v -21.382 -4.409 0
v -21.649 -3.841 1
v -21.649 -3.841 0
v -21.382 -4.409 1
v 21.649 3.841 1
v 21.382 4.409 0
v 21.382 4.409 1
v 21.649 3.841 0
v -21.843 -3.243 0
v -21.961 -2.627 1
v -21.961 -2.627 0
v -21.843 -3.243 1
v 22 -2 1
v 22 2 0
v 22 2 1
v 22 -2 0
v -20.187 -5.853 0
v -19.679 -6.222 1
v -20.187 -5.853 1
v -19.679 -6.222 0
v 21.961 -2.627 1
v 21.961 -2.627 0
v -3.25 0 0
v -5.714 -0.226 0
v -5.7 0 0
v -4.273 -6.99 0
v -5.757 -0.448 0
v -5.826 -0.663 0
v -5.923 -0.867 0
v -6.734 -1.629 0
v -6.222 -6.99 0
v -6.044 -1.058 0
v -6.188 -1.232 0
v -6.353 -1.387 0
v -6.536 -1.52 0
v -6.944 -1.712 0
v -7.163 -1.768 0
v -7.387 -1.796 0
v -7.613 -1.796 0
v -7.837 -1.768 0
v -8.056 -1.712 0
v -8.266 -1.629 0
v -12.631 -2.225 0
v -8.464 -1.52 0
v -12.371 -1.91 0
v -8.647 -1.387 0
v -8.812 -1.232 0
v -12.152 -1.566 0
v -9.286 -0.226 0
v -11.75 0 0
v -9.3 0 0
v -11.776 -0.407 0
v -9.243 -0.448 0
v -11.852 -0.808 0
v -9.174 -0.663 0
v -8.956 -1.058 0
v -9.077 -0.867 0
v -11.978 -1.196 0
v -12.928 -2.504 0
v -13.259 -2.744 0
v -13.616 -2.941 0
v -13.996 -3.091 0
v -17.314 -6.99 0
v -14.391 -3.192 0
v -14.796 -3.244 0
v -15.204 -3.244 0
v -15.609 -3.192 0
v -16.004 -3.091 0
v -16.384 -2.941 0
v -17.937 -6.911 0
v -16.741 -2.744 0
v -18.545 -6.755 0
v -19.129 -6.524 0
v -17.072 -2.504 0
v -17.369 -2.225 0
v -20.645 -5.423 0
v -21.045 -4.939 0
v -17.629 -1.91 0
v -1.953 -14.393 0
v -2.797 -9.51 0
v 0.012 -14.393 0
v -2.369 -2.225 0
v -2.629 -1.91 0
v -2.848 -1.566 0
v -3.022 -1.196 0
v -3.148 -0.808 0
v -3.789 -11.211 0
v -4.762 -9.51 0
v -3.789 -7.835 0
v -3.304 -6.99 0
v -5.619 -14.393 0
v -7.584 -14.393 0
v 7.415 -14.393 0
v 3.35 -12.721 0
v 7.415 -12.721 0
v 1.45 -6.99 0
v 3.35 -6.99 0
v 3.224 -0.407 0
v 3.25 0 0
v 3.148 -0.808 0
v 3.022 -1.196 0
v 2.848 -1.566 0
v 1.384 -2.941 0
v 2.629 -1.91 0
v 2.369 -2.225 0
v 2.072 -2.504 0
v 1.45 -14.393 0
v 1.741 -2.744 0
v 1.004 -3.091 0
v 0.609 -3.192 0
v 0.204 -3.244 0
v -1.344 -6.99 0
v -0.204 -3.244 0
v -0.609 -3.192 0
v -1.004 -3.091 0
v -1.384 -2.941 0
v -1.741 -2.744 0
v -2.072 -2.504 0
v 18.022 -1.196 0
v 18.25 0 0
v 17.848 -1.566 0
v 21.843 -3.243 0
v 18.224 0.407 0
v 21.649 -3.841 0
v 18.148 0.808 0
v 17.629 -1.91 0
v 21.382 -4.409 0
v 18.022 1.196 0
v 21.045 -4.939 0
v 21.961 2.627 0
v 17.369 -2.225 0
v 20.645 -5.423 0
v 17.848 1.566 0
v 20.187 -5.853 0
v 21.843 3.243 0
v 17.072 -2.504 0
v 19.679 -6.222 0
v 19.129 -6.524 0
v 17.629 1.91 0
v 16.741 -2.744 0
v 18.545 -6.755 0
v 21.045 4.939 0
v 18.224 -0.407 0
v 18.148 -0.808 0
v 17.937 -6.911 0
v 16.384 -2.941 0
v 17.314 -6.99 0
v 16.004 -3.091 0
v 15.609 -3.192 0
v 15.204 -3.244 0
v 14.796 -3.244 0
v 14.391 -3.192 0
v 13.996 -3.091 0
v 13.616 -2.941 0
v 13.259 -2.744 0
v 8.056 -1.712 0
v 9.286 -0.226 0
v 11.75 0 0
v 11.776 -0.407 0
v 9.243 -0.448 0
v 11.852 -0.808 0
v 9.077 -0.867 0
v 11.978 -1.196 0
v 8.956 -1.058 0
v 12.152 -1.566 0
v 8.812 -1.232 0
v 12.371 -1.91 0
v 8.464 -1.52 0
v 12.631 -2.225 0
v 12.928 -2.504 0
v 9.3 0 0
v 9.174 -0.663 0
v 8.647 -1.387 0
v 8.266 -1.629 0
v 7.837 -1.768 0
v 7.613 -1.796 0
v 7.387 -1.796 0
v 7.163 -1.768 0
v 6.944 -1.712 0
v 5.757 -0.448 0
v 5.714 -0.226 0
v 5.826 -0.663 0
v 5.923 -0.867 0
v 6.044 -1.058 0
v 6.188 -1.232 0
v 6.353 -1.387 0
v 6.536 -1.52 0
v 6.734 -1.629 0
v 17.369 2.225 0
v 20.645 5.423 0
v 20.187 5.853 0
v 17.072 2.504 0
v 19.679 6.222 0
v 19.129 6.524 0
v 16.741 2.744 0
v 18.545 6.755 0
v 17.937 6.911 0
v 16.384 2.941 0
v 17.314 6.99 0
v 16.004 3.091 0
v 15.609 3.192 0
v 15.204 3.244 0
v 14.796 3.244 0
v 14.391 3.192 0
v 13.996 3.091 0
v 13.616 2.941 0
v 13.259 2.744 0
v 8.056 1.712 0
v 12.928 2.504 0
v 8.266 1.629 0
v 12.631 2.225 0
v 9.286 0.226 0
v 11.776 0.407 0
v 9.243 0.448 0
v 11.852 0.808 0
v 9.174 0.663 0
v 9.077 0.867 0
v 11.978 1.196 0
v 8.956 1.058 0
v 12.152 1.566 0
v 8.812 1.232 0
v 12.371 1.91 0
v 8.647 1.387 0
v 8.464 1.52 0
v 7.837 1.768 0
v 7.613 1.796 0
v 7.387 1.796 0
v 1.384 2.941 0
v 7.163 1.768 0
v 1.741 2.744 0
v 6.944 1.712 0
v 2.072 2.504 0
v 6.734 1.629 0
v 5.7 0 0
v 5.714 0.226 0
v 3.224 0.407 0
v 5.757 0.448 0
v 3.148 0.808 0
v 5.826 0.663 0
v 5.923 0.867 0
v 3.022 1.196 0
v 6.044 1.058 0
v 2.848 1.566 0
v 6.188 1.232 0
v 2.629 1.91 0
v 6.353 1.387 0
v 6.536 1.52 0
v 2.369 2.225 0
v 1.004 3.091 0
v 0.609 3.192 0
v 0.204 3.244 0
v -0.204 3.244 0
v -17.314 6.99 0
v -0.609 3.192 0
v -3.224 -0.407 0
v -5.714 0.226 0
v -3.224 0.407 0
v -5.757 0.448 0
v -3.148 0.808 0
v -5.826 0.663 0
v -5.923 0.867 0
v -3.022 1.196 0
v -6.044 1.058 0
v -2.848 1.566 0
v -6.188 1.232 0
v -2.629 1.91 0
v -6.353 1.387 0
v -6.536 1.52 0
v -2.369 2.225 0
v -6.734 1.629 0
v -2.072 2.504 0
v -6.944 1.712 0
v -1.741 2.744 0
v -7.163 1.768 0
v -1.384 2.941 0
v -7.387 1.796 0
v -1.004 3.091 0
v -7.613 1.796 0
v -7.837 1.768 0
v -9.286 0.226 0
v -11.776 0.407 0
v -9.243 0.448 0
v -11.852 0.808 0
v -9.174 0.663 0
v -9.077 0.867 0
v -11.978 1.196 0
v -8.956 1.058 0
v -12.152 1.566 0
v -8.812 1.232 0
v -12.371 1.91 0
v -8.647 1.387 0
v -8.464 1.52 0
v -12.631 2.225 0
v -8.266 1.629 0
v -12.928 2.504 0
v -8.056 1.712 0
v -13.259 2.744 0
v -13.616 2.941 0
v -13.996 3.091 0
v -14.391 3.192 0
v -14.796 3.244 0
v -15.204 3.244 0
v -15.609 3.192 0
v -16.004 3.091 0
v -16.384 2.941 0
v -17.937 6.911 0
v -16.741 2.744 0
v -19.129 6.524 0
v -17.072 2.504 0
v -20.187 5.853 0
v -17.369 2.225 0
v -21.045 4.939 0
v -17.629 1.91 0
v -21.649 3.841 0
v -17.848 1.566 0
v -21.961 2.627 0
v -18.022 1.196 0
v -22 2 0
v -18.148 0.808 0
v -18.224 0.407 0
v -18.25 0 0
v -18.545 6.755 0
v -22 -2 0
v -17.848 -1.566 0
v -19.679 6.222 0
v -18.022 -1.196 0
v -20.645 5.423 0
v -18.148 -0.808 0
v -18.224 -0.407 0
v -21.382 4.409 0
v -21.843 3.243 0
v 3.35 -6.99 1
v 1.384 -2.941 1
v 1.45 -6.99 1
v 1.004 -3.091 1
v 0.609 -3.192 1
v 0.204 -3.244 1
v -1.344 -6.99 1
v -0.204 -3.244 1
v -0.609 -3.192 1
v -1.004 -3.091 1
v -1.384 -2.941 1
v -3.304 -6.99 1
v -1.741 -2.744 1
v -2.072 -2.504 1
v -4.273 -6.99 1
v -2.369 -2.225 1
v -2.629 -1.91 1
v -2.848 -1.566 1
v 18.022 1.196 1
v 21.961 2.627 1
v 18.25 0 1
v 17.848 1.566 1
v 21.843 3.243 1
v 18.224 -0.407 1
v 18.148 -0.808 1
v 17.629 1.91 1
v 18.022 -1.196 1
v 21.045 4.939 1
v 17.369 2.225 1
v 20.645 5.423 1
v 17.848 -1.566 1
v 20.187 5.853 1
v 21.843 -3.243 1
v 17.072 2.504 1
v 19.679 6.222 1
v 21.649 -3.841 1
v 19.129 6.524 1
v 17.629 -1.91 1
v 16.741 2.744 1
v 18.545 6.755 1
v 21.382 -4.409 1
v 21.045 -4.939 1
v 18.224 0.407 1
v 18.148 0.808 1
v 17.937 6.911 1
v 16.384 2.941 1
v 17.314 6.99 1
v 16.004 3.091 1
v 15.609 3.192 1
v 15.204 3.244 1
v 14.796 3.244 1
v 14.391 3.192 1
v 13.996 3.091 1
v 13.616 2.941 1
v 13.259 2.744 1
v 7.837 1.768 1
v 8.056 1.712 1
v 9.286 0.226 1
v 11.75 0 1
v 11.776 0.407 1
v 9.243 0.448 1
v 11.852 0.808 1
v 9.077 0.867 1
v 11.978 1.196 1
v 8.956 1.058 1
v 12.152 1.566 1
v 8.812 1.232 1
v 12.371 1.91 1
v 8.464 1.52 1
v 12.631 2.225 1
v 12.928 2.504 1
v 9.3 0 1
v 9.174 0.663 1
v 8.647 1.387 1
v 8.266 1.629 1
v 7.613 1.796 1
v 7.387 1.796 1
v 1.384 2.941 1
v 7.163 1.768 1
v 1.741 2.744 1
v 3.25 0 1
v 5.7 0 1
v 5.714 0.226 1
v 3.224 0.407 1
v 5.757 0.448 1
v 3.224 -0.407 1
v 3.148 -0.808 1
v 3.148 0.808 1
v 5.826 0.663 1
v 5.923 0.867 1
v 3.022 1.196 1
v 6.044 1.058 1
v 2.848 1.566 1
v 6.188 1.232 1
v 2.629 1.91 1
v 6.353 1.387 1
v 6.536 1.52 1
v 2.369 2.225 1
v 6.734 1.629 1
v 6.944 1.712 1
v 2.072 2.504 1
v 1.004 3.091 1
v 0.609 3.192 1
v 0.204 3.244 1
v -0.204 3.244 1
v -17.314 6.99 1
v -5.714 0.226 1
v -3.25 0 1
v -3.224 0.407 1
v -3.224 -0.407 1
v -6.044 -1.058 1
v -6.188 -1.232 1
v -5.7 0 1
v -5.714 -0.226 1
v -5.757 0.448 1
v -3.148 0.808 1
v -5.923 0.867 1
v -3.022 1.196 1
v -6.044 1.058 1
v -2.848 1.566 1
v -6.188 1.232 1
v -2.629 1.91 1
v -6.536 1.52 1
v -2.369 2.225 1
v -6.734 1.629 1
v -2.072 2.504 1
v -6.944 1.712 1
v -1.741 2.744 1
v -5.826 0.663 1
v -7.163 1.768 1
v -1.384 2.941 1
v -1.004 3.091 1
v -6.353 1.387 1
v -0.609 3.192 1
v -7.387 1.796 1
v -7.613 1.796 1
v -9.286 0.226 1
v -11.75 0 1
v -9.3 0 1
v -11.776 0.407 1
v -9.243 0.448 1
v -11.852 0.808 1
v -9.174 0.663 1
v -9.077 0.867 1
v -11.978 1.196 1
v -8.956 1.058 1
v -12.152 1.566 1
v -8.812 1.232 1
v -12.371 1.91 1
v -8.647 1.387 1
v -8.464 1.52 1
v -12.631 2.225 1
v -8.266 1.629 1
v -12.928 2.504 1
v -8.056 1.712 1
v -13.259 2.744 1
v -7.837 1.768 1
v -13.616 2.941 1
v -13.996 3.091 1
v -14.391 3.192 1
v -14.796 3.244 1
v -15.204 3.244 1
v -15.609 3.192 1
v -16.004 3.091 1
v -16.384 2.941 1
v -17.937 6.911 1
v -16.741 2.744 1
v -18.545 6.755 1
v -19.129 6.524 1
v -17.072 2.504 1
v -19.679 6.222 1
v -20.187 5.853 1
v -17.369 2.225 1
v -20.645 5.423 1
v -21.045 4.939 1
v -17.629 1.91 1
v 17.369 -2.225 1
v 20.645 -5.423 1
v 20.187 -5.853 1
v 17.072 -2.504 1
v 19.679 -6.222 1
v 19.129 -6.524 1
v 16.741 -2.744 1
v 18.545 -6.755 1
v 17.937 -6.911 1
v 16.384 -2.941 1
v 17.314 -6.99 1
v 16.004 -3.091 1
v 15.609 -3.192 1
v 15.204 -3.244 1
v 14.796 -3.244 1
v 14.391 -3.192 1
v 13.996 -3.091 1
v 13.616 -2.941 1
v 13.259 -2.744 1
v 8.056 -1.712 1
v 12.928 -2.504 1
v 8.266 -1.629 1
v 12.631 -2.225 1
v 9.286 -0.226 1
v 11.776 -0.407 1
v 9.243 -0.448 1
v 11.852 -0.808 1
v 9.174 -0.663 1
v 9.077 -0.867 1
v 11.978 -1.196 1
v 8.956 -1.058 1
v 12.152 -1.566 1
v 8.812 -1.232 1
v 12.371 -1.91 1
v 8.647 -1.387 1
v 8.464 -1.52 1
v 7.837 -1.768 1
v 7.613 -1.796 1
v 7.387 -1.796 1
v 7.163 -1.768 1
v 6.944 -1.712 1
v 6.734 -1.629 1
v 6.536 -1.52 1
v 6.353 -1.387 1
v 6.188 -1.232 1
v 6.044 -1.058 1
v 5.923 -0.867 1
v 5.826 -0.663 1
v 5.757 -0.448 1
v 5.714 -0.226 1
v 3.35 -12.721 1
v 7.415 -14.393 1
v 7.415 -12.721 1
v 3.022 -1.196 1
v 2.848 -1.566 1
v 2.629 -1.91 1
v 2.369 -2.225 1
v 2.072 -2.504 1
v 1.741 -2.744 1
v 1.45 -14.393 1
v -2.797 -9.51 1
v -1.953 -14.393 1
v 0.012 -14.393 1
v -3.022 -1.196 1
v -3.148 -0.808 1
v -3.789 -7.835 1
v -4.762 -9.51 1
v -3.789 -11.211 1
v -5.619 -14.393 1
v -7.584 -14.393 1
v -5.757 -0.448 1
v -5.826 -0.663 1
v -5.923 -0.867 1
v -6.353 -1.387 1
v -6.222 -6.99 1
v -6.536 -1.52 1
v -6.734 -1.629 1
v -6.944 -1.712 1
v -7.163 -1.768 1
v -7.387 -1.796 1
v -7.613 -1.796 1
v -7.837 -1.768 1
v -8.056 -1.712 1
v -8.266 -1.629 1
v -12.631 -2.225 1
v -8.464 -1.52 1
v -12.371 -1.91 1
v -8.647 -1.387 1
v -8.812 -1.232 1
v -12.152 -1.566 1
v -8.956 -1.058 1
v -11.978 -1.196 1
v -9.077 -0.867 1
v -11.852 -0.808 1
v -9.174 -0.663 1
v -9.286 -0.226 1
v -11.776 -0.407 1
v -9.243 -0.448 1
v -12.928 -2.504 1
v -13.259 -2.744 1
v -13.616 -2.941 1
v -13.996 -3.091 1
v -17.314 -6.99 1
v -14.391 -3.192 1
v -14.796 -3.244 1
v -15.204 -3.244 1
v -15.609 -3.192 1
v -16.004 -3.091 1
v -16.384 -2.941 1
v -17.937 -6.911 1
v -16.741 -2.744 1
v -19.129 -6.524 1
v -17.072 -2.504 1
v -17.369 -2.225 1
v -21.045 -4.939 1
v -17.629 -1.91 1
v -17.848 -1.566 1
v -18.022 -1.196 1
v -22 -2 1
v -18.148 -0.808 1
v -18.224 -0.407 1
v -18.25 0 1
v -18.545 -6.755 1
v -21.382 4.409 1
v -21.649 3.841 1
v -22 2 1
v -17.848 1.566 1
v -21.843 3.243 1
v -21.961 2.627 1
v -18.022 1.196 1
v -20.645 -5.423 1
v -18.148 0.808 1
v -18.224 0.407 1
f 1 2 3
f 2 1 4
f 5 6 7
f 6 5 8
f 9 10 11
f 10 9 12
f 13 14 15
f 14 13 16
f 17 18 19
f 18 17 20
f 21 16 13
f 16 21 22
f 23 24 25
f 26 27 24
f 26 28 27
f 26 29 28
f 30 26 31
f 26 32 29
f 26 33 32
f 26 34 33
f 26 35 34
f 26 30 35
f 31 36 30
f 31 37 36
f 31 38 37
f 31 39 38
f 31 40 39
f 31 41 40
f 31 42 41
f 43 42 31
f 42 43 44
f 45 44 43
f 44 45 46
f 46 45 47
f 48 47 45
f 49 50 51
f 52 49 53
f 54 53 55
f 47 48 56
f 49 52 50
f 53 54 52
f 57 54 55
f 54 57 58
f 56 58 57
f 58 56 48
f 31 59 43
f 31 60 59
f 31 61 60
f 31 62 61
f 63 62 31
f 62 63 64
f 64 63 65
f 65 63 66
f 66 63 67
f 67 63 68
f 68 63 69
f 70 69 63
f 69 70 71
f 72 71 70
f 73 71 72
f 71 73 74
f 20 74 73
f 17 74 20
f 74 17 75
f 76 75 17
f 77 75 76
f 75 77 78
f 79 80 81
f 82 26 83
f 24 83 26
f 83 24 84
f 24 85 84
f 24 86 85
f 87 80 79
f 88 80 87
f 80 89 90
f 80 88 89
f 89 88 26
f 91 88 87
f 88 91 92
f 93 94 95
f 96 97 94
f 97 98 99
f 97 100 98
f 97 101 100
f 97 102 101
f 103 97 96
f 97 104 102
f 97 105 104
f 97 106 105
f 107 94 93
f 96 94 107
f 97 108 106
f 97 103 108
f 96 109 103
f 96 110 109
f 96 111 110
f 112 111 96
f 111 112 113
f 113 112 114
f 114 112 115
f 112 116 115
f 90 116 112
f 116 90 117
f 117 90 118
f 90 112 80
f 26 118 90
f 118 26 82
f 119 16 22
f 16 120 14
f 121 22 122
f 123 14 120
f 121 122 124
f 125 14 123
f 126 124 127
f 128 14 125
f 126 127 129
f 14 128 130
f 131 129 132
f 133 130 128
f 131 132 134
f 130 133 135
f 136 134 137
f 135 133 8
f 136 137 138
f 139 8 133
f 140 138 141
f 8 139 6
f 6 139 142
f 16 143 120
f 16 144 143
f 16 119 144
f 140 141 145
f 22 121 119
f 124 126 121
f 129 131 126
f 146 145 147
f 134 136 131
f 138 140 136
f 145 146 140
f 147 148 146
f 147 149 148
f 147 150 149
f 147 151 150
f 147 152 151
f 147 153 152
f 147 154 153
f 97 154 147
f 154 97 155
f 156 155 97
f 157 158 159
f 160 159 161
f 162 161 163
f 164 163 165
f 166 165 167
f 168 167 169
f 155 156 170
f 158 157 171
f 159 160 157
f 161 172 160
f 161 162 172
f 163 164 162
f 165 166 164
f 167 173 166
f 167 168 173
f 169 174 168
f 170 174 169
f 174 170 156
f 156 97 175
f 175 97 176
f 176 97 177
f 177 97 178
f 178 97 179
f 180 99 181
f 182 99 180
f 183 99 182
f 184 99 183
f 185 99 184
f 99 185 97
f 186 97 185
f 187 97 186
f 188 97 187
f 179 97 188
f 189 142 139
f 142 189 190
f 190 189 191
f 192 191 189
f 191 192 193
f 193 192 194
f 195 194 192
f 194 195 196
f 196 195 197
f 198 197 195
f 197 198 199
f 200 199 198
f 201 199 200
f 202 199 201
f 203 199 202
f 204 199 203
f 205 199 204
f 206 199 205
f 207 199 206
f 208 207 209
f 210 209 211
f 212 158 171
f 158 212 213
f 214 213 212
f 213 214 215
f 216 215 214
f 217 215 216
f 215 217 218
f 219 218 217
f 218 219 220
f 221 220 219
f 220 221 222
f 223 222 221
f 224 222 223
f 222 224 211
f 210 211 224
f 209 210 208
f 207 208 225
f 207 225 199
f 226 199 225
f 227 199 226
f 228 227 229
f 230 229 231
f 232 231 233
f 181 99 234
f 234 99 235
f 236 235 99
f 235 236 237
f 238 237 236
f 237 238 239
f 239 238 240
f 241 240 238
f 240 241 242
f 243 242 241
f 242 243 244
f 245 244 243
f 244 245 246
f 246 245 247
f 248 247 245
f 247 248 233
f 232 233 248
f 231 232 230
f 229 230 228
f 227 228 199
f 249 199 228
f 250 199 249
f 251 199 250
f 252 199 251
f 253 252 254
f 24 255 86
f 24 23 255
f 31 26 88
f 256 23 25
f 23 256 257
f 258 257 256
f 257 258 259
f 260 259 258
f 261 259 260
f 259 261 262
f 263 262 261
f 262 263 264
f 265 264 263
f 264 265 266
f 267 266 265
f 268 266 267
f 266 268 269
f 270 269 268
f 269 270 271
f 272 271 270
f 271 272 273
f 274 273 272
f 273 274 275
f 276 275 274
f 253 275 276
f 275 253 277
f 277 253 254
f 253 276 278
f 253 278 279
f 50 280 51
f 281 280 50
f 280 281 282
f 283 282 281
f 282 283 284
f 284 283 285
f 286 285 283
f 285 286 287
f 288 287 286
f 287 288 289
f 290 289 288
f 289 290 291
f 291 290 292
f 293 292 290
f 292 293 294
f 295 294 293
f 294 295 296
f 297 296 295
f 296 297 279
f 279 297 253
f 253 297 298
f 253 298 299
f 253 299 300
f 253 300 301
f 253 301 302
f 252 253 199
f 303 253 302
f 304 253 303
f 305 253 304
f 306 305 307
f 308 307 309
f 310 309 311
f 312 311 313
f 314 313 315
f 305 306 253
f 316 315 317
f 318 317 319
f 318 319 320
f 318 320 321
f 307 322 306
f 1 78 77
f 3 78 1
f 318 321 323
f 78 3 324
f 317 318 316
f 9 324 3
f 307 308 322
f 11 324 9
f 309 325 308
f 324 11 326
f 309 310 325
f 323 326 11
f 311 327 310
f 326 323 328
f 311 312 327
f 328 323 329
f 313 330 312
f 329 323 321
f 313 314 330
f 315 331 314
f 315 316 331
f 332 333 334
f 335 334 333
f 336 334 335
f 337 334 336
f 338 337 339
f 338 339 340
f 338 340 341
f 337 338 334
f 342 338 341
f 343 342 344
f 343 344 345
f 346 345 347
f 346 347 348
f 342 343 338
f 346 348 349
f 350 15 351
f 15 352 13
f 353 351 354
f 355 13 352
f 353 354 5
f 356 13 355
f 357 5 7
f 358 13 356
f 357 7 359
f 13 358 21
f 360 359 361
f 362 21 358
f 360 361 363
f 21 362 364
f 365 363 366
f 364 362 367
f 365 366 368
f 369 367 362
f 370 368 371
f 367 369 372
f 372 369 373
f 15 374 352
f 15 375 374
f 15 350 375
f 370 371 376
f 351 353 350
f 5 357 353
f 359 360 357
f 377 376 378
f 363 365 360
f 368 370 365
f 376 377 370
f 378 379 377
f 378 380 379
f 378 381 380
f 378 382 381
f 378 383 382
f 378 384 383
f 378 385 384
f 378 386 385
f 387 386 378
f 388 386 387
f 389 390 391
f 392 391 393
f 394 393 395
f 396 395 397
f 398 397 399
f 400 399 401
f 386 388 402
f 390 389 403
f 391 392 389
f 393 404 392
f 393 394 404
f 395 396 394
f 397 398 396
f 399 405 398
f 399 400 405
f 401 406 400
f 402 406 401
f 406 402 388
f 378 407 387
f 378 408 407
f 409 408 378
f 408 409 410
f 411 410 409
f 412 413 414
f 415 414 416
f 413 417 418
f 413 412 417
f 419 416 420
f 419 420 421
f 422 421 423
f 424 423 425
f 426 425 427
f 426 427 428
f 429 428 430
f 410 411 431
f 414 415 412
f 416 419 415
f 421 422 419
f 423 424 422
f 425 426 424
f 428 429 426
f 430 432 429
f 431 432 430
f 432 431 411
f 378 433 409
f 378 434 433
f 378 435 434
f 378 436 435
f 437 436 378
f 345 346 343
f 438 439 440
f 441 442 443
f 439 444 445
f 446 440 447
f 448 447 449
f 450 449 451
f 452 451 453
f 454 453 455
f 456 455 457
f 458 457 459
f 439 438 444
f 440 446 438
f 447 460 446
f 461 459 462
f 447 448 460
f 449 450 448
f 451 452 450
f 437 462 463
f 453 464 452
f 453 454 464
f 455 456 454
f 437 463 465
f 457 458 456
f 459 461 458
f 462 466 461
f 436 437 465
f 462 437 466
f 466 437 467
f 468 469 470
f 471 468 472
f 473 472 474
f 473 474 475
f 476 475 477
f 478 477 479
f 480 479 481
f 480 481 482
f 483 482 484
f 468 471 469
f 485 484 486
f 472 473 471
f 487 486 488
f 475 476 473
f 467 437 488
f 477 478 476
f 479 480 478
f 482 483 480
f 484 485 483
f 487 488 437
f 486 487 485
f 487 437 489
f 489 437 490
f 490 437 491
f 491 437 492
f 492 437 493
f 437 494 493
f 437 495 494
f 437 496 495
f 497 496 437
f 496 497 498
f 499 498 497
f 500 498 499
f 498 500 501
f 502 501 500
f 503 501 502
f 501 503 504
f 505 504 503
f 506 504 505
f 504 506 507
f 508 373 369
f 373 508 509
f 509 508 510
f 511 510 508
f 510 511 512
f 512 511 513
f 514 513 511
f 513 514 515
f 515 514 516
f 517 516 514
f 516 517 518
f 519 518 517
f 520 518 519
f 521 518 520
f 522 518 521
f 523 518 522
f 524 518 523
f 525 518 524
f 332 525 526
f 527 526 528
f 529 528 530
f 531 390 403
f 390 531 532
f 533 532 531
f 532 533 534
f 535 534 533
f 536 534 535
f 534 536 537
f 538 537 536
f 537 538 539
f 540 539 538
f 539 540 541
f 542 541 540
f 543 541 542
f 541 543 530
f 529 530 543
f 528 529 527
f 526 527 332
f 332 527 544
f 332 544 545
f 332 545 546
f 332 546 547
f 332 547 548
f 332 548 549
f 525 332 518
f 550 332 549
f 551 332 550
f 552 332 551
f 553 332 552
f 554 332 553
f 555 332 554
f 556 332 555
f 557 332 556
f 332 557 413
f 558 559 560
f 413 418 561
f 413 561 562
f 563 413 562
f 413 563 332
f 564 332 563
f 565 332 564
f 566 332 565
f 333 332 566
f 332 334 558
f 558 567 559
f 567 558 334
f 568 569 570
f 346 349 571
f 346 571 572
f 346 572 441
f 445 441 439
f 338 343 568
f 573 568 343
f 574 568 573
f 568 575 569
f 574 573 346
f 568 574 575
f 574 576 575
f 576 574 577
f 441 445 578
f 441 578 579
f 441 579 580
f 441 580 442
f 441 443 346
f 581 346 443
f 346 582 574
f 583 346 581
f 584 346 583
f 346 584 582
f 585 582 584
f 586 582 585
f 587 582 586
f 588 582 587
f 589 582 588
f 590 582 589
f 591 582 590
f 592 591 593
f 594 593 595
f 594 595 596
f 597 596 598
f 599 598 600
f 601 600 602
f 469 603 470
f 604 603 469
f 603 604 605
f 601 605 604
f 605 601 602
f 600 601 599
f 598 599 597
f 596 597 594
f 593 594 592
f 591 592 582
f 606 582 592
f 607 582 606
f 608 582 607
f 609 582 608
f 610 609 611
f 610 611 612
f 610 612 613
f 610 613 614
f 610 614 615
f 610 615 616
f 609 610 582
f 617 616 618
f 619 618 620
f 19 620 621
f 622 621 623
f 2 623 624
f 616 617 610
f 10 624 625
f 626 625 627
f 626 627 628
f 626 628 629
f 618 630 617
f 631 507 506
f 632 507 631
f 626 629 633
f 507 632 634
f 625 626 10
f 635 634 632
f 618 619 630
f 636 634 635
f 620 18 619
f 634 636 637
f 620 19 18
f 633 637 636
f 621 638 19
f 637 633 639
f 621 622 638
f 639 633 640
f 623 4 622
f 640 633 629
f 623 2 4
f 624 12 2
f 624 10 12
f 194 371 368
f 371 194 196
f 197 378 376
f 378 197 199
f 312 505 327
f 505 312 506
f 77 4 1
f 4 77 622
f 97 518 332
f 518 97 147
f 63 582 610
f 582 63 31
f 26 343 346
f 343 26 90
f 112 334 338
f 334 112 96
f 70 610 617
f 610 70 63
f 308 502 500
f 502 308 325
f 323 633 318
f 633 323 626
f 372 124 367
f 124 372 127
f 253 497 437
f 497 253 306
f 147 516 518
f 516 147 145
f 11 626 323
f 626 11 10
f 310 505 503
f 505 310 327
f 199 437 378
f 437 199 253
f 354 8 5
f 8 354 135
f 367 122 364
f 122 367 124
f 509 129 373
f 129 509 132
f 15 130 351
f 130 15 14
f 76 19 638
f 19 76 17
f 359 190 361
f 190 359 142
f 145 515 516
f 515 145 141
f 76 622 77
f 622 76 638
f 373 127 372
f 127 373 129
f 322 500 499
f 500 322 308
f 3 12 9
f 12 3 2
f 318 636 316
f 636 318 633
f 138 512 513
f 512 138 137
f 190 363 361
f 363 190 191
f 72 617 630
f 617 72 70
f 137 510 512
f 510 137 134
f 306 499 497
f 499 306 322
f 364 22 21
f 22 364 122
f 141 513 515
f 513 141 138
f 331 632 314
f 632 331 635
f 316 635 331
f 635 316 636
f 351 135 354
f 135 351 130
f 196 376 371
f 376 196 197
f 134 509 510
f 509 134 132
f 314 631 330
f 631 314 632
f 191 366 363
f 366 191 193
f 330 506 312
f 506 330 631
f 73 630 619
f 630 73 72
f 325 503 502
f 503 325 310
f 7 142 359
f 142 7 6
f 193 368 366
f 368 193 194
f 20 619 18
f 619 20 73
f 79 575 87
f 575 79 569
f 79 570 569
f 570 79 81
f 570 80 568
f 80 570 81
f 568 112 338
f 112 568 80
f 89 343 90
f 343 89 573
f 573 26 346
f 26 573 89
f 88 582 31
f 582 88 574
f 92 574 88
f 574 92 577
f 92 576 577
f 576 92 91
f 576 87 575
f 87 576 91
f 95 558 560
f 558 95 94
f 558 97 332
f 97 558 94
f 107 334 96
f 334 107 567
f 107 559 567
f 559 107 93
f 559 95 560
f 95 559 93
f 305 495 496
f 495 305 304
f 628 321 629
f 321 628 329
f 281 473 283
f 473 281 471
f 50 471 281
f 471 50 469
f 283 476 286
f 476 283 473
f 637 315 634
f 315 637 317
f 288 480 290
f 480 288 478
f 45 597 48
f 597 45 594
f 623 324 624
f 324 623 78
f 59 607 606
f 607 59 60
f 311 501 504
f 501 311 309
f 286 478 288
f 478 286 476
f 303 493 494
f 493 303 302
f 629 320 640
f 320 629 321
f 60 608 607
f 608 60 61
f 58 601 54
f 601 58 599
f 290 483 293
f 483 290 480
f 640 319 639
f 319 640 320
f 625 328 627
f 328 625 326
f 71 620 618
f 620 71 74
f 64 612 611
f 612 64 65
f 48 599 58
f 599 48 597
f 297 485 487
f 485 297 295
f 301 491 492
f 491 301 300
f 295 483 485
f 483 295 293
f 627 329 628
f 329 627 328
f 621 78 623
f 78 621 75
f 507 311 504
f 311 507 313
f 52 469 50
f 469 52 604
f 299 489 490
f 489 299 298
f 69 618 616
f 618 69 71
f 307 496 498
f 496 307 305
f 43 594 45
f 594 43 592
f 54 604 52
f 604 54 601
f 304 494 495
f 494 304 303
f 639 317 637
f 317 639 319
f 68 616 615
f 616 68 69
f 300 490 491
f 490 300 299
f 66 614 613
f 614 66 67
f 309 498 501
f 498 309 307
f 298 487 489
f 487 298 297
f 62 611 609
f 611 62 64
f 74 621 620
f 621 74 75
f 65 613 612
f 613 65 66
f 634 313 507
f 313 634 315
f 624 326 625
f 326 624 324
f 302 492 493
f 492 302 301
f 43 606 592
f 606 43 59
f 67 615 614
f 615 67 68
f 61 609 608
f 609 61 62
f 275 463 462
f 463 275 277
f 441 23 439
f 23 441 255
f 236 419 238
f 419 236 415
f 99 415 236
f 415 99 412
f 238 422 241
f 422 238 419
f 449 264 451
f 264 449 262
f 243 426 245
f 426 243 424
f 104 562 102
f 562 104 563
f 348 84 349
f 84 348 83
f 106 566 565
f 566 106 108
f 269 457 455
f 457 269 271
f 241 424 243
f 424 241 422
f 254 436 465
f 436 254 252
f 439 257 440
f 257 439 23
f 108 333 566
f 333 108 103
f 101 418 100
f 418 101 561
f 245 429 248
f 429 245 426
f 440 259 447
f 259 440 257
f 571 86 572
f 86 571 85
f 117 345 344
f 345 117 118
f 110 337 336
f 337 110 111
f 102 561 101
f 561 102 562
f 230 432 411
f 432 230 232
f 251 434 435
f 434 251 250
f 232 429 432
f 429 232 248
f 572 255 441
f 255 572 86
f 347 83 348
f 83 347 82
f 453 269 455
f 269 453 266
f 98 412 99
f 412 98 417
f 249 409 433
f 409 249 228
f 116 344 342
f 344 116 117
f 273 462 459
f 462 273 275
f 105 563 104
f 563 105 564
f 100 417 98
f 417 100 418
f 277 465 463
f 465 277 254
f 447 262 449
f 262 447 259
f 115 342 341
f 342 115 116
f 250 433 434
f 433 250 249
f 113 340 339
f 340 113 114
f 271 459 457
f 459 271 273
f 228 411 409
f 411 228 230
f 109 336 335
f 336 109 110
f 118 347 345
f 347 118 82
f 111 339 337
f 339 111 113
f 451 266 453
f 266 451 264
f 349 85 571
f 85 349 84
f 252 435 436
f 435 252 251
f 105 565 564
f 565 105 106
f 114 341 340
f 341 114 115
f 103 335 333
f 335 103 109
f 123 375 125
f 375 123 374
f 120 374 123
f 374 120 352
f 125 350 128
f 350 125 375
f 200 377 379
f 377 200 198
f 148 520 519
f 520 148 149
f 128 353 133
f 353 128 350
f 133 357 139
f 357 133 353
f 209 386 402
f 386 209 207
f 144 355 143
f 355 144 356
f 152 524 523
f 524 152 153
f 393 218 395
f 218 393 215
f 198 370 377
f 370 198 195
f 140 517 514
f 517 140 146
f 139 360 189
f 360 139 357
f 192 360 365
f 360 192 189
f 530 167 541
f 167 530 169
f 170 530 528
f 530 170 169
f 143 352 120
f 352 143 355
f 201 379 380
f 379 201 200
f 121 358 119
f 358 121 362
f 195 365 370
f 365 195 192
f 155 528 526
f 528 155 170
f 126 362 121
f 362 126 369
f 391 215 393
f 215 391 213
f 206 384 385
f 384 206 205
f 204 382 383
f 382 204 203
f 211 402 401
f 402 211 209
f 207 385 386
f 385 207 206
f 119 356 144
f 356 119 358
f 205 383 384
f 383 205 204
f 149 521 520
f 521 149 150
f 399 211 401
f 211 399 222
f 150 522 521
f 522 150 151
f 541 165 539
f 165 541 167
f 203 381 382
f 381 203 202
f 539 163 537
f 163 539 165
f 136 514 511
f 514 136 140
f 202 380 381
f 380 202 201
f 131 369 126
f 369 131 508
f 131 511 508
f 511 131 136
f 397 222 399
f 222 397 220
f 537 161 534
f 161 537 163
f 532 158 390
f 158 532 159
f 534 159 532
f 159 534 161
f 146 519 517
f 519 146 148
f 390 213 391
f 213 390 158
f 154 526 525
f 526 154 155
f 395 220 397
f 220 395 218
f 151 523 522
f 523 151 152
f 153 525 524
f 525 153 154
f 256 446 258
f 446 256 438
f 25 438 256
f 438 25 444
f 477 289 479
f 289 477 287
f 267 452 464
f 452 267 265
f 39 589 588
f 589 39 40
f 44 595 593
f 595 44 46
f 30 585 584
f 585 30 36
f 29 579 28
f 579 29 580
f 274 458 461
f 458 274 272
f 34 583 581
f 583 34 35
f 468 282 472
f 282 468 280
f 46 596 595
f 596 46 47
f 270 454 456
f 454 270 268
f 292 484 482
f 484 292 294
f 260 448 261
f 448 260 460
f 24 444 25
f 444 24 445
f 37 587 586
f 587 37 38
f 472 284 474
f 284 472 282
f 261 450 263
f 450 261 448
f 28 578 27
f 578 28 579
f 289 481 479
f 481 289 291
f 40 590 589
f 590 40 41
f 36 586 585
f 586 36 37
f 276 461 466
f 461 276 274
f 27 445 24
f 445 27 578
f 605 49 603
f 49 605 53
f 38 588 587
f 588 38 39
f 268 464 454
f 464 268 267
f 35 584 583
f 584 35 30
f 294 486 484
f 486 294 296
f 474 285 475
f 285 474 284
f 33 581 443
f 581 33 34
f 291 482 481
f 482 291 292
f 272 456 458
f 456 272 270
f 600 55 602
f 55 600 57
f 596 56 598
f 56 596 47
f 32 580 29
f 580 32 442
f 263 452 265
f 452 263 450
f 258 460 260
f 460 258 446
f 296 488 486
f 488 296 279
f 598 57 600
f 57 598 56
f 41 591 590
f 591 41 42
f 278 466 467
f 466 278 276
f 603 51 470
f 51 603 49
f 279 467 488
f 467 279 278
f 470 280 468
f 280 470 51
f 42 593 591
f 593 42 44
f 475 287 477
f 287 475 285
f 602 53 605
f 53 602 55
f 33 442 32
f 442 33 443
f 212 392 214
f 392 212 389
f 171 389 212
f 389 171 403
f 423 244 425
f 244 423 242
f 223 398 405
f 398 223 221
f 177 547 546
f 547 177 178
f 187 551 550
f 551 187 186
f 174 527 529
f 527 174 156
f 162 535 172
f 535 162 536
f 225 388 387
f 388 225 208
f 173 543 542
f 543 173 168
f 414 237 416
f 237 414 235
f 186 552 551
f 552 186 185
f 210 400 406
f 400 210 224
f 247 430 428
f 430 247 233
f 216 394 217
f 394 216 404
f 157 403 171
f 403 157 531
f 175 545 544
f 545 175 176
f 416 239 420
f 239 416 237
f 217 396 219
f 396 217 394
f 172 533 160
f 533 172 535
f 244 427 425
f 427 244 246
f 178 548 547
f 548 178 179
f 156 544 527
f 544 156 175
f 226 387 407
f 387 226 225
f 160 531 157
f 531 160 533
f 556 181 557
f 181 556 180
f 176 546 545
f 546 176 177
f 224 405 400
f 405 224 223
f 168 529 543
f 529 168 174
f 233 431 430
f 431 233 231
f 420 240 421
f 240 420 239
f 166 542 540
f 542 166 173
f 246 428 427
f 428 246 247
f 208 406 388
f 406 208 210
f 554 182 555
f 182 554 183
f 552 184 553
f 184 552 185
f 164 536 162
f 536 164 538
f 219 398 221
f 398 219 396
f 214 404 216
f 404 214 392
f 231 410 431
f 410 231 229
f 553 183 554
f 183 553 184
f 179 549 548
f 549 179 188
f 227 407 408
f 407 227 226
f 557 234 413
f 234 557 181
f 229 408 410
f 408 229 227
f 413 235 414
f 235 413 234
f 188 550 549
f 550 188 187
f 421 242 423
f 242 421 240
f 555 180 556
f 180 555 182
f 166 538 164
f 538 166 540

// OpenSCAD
$fn = 50;


difference() {
	union() {
		hull() {
			translate(v = [-17.0000000000, 2.0000000000, 0]) {
				cylinder(h = 1, r = 5);
			}
			translate(v = [17.0000000000, 2.0000000000, 0]) {
				cylinder(h = 1, r = 5);
			}
			translate(v = [-17.0000000000, -2.0000000000, 0]) {
				cylinder(h = 1, r = 5);
			}
			translate(v = [17.0000000000, -2.0000000000, 0]) {
				cylinder(h = 1, r = 5);
			}
		}
		translate(v = [0, -5, 0]) {
			linear_extrude(height = 1) {
				text(font = "DejaVu Sans Mono:style=Bold", halign = "center", size = 9.5000000000, text = "XL", valign = "top");
			}
		}
	}
	union() {
		translate(v = [-15.0000000000, 0.0000000000, 0]) {
			translate(v = [0, 0, -100]) {
				cylinder(h = 200, r = 3.2500000000);
			}
		}
		translate(v = [0, 0, -100]) {
			cylinder(h = 200, r = 3.2500000000);
		}
		translate(v = [15.0000000000, 0.0000000000, 0]) {
			translate(v = [0, 0, -100]) {
				cylinder(h = 200, r = 3.2500000000);
			}
		}
		translate(v = [-15.0000000000, 0.0000000000, 0]) {
			translate(v = [0, 0, -100]) {
				cylinder(h = 200, r = 1.8000000000);
			}
		}
		translate(v = [-7.5000000000, 0.0000000000, 0]) {
			translate(v = [0, 0, -100]) {
				cylinder(h = 200, r = 1.8000000000);
			}
		}
		translate(v = [0, 0, -100]) {
			cylinder(h = 200, r = 1.8000000000);
		}
		translate(v = [7.5000000000, 0.0000000000, 0]) {
			translate(v = [0, 0, -100]) {
				cylinder(h = 200, r = 1.8000000000);
			}
		}
		translate(v = [15.0000000000, 0.0000000000, 0]) {
			translate(v = [0, 0, -100]) {
				cylinder(h = 200, r = 1.8000000000);
			}
		}
	}
}
